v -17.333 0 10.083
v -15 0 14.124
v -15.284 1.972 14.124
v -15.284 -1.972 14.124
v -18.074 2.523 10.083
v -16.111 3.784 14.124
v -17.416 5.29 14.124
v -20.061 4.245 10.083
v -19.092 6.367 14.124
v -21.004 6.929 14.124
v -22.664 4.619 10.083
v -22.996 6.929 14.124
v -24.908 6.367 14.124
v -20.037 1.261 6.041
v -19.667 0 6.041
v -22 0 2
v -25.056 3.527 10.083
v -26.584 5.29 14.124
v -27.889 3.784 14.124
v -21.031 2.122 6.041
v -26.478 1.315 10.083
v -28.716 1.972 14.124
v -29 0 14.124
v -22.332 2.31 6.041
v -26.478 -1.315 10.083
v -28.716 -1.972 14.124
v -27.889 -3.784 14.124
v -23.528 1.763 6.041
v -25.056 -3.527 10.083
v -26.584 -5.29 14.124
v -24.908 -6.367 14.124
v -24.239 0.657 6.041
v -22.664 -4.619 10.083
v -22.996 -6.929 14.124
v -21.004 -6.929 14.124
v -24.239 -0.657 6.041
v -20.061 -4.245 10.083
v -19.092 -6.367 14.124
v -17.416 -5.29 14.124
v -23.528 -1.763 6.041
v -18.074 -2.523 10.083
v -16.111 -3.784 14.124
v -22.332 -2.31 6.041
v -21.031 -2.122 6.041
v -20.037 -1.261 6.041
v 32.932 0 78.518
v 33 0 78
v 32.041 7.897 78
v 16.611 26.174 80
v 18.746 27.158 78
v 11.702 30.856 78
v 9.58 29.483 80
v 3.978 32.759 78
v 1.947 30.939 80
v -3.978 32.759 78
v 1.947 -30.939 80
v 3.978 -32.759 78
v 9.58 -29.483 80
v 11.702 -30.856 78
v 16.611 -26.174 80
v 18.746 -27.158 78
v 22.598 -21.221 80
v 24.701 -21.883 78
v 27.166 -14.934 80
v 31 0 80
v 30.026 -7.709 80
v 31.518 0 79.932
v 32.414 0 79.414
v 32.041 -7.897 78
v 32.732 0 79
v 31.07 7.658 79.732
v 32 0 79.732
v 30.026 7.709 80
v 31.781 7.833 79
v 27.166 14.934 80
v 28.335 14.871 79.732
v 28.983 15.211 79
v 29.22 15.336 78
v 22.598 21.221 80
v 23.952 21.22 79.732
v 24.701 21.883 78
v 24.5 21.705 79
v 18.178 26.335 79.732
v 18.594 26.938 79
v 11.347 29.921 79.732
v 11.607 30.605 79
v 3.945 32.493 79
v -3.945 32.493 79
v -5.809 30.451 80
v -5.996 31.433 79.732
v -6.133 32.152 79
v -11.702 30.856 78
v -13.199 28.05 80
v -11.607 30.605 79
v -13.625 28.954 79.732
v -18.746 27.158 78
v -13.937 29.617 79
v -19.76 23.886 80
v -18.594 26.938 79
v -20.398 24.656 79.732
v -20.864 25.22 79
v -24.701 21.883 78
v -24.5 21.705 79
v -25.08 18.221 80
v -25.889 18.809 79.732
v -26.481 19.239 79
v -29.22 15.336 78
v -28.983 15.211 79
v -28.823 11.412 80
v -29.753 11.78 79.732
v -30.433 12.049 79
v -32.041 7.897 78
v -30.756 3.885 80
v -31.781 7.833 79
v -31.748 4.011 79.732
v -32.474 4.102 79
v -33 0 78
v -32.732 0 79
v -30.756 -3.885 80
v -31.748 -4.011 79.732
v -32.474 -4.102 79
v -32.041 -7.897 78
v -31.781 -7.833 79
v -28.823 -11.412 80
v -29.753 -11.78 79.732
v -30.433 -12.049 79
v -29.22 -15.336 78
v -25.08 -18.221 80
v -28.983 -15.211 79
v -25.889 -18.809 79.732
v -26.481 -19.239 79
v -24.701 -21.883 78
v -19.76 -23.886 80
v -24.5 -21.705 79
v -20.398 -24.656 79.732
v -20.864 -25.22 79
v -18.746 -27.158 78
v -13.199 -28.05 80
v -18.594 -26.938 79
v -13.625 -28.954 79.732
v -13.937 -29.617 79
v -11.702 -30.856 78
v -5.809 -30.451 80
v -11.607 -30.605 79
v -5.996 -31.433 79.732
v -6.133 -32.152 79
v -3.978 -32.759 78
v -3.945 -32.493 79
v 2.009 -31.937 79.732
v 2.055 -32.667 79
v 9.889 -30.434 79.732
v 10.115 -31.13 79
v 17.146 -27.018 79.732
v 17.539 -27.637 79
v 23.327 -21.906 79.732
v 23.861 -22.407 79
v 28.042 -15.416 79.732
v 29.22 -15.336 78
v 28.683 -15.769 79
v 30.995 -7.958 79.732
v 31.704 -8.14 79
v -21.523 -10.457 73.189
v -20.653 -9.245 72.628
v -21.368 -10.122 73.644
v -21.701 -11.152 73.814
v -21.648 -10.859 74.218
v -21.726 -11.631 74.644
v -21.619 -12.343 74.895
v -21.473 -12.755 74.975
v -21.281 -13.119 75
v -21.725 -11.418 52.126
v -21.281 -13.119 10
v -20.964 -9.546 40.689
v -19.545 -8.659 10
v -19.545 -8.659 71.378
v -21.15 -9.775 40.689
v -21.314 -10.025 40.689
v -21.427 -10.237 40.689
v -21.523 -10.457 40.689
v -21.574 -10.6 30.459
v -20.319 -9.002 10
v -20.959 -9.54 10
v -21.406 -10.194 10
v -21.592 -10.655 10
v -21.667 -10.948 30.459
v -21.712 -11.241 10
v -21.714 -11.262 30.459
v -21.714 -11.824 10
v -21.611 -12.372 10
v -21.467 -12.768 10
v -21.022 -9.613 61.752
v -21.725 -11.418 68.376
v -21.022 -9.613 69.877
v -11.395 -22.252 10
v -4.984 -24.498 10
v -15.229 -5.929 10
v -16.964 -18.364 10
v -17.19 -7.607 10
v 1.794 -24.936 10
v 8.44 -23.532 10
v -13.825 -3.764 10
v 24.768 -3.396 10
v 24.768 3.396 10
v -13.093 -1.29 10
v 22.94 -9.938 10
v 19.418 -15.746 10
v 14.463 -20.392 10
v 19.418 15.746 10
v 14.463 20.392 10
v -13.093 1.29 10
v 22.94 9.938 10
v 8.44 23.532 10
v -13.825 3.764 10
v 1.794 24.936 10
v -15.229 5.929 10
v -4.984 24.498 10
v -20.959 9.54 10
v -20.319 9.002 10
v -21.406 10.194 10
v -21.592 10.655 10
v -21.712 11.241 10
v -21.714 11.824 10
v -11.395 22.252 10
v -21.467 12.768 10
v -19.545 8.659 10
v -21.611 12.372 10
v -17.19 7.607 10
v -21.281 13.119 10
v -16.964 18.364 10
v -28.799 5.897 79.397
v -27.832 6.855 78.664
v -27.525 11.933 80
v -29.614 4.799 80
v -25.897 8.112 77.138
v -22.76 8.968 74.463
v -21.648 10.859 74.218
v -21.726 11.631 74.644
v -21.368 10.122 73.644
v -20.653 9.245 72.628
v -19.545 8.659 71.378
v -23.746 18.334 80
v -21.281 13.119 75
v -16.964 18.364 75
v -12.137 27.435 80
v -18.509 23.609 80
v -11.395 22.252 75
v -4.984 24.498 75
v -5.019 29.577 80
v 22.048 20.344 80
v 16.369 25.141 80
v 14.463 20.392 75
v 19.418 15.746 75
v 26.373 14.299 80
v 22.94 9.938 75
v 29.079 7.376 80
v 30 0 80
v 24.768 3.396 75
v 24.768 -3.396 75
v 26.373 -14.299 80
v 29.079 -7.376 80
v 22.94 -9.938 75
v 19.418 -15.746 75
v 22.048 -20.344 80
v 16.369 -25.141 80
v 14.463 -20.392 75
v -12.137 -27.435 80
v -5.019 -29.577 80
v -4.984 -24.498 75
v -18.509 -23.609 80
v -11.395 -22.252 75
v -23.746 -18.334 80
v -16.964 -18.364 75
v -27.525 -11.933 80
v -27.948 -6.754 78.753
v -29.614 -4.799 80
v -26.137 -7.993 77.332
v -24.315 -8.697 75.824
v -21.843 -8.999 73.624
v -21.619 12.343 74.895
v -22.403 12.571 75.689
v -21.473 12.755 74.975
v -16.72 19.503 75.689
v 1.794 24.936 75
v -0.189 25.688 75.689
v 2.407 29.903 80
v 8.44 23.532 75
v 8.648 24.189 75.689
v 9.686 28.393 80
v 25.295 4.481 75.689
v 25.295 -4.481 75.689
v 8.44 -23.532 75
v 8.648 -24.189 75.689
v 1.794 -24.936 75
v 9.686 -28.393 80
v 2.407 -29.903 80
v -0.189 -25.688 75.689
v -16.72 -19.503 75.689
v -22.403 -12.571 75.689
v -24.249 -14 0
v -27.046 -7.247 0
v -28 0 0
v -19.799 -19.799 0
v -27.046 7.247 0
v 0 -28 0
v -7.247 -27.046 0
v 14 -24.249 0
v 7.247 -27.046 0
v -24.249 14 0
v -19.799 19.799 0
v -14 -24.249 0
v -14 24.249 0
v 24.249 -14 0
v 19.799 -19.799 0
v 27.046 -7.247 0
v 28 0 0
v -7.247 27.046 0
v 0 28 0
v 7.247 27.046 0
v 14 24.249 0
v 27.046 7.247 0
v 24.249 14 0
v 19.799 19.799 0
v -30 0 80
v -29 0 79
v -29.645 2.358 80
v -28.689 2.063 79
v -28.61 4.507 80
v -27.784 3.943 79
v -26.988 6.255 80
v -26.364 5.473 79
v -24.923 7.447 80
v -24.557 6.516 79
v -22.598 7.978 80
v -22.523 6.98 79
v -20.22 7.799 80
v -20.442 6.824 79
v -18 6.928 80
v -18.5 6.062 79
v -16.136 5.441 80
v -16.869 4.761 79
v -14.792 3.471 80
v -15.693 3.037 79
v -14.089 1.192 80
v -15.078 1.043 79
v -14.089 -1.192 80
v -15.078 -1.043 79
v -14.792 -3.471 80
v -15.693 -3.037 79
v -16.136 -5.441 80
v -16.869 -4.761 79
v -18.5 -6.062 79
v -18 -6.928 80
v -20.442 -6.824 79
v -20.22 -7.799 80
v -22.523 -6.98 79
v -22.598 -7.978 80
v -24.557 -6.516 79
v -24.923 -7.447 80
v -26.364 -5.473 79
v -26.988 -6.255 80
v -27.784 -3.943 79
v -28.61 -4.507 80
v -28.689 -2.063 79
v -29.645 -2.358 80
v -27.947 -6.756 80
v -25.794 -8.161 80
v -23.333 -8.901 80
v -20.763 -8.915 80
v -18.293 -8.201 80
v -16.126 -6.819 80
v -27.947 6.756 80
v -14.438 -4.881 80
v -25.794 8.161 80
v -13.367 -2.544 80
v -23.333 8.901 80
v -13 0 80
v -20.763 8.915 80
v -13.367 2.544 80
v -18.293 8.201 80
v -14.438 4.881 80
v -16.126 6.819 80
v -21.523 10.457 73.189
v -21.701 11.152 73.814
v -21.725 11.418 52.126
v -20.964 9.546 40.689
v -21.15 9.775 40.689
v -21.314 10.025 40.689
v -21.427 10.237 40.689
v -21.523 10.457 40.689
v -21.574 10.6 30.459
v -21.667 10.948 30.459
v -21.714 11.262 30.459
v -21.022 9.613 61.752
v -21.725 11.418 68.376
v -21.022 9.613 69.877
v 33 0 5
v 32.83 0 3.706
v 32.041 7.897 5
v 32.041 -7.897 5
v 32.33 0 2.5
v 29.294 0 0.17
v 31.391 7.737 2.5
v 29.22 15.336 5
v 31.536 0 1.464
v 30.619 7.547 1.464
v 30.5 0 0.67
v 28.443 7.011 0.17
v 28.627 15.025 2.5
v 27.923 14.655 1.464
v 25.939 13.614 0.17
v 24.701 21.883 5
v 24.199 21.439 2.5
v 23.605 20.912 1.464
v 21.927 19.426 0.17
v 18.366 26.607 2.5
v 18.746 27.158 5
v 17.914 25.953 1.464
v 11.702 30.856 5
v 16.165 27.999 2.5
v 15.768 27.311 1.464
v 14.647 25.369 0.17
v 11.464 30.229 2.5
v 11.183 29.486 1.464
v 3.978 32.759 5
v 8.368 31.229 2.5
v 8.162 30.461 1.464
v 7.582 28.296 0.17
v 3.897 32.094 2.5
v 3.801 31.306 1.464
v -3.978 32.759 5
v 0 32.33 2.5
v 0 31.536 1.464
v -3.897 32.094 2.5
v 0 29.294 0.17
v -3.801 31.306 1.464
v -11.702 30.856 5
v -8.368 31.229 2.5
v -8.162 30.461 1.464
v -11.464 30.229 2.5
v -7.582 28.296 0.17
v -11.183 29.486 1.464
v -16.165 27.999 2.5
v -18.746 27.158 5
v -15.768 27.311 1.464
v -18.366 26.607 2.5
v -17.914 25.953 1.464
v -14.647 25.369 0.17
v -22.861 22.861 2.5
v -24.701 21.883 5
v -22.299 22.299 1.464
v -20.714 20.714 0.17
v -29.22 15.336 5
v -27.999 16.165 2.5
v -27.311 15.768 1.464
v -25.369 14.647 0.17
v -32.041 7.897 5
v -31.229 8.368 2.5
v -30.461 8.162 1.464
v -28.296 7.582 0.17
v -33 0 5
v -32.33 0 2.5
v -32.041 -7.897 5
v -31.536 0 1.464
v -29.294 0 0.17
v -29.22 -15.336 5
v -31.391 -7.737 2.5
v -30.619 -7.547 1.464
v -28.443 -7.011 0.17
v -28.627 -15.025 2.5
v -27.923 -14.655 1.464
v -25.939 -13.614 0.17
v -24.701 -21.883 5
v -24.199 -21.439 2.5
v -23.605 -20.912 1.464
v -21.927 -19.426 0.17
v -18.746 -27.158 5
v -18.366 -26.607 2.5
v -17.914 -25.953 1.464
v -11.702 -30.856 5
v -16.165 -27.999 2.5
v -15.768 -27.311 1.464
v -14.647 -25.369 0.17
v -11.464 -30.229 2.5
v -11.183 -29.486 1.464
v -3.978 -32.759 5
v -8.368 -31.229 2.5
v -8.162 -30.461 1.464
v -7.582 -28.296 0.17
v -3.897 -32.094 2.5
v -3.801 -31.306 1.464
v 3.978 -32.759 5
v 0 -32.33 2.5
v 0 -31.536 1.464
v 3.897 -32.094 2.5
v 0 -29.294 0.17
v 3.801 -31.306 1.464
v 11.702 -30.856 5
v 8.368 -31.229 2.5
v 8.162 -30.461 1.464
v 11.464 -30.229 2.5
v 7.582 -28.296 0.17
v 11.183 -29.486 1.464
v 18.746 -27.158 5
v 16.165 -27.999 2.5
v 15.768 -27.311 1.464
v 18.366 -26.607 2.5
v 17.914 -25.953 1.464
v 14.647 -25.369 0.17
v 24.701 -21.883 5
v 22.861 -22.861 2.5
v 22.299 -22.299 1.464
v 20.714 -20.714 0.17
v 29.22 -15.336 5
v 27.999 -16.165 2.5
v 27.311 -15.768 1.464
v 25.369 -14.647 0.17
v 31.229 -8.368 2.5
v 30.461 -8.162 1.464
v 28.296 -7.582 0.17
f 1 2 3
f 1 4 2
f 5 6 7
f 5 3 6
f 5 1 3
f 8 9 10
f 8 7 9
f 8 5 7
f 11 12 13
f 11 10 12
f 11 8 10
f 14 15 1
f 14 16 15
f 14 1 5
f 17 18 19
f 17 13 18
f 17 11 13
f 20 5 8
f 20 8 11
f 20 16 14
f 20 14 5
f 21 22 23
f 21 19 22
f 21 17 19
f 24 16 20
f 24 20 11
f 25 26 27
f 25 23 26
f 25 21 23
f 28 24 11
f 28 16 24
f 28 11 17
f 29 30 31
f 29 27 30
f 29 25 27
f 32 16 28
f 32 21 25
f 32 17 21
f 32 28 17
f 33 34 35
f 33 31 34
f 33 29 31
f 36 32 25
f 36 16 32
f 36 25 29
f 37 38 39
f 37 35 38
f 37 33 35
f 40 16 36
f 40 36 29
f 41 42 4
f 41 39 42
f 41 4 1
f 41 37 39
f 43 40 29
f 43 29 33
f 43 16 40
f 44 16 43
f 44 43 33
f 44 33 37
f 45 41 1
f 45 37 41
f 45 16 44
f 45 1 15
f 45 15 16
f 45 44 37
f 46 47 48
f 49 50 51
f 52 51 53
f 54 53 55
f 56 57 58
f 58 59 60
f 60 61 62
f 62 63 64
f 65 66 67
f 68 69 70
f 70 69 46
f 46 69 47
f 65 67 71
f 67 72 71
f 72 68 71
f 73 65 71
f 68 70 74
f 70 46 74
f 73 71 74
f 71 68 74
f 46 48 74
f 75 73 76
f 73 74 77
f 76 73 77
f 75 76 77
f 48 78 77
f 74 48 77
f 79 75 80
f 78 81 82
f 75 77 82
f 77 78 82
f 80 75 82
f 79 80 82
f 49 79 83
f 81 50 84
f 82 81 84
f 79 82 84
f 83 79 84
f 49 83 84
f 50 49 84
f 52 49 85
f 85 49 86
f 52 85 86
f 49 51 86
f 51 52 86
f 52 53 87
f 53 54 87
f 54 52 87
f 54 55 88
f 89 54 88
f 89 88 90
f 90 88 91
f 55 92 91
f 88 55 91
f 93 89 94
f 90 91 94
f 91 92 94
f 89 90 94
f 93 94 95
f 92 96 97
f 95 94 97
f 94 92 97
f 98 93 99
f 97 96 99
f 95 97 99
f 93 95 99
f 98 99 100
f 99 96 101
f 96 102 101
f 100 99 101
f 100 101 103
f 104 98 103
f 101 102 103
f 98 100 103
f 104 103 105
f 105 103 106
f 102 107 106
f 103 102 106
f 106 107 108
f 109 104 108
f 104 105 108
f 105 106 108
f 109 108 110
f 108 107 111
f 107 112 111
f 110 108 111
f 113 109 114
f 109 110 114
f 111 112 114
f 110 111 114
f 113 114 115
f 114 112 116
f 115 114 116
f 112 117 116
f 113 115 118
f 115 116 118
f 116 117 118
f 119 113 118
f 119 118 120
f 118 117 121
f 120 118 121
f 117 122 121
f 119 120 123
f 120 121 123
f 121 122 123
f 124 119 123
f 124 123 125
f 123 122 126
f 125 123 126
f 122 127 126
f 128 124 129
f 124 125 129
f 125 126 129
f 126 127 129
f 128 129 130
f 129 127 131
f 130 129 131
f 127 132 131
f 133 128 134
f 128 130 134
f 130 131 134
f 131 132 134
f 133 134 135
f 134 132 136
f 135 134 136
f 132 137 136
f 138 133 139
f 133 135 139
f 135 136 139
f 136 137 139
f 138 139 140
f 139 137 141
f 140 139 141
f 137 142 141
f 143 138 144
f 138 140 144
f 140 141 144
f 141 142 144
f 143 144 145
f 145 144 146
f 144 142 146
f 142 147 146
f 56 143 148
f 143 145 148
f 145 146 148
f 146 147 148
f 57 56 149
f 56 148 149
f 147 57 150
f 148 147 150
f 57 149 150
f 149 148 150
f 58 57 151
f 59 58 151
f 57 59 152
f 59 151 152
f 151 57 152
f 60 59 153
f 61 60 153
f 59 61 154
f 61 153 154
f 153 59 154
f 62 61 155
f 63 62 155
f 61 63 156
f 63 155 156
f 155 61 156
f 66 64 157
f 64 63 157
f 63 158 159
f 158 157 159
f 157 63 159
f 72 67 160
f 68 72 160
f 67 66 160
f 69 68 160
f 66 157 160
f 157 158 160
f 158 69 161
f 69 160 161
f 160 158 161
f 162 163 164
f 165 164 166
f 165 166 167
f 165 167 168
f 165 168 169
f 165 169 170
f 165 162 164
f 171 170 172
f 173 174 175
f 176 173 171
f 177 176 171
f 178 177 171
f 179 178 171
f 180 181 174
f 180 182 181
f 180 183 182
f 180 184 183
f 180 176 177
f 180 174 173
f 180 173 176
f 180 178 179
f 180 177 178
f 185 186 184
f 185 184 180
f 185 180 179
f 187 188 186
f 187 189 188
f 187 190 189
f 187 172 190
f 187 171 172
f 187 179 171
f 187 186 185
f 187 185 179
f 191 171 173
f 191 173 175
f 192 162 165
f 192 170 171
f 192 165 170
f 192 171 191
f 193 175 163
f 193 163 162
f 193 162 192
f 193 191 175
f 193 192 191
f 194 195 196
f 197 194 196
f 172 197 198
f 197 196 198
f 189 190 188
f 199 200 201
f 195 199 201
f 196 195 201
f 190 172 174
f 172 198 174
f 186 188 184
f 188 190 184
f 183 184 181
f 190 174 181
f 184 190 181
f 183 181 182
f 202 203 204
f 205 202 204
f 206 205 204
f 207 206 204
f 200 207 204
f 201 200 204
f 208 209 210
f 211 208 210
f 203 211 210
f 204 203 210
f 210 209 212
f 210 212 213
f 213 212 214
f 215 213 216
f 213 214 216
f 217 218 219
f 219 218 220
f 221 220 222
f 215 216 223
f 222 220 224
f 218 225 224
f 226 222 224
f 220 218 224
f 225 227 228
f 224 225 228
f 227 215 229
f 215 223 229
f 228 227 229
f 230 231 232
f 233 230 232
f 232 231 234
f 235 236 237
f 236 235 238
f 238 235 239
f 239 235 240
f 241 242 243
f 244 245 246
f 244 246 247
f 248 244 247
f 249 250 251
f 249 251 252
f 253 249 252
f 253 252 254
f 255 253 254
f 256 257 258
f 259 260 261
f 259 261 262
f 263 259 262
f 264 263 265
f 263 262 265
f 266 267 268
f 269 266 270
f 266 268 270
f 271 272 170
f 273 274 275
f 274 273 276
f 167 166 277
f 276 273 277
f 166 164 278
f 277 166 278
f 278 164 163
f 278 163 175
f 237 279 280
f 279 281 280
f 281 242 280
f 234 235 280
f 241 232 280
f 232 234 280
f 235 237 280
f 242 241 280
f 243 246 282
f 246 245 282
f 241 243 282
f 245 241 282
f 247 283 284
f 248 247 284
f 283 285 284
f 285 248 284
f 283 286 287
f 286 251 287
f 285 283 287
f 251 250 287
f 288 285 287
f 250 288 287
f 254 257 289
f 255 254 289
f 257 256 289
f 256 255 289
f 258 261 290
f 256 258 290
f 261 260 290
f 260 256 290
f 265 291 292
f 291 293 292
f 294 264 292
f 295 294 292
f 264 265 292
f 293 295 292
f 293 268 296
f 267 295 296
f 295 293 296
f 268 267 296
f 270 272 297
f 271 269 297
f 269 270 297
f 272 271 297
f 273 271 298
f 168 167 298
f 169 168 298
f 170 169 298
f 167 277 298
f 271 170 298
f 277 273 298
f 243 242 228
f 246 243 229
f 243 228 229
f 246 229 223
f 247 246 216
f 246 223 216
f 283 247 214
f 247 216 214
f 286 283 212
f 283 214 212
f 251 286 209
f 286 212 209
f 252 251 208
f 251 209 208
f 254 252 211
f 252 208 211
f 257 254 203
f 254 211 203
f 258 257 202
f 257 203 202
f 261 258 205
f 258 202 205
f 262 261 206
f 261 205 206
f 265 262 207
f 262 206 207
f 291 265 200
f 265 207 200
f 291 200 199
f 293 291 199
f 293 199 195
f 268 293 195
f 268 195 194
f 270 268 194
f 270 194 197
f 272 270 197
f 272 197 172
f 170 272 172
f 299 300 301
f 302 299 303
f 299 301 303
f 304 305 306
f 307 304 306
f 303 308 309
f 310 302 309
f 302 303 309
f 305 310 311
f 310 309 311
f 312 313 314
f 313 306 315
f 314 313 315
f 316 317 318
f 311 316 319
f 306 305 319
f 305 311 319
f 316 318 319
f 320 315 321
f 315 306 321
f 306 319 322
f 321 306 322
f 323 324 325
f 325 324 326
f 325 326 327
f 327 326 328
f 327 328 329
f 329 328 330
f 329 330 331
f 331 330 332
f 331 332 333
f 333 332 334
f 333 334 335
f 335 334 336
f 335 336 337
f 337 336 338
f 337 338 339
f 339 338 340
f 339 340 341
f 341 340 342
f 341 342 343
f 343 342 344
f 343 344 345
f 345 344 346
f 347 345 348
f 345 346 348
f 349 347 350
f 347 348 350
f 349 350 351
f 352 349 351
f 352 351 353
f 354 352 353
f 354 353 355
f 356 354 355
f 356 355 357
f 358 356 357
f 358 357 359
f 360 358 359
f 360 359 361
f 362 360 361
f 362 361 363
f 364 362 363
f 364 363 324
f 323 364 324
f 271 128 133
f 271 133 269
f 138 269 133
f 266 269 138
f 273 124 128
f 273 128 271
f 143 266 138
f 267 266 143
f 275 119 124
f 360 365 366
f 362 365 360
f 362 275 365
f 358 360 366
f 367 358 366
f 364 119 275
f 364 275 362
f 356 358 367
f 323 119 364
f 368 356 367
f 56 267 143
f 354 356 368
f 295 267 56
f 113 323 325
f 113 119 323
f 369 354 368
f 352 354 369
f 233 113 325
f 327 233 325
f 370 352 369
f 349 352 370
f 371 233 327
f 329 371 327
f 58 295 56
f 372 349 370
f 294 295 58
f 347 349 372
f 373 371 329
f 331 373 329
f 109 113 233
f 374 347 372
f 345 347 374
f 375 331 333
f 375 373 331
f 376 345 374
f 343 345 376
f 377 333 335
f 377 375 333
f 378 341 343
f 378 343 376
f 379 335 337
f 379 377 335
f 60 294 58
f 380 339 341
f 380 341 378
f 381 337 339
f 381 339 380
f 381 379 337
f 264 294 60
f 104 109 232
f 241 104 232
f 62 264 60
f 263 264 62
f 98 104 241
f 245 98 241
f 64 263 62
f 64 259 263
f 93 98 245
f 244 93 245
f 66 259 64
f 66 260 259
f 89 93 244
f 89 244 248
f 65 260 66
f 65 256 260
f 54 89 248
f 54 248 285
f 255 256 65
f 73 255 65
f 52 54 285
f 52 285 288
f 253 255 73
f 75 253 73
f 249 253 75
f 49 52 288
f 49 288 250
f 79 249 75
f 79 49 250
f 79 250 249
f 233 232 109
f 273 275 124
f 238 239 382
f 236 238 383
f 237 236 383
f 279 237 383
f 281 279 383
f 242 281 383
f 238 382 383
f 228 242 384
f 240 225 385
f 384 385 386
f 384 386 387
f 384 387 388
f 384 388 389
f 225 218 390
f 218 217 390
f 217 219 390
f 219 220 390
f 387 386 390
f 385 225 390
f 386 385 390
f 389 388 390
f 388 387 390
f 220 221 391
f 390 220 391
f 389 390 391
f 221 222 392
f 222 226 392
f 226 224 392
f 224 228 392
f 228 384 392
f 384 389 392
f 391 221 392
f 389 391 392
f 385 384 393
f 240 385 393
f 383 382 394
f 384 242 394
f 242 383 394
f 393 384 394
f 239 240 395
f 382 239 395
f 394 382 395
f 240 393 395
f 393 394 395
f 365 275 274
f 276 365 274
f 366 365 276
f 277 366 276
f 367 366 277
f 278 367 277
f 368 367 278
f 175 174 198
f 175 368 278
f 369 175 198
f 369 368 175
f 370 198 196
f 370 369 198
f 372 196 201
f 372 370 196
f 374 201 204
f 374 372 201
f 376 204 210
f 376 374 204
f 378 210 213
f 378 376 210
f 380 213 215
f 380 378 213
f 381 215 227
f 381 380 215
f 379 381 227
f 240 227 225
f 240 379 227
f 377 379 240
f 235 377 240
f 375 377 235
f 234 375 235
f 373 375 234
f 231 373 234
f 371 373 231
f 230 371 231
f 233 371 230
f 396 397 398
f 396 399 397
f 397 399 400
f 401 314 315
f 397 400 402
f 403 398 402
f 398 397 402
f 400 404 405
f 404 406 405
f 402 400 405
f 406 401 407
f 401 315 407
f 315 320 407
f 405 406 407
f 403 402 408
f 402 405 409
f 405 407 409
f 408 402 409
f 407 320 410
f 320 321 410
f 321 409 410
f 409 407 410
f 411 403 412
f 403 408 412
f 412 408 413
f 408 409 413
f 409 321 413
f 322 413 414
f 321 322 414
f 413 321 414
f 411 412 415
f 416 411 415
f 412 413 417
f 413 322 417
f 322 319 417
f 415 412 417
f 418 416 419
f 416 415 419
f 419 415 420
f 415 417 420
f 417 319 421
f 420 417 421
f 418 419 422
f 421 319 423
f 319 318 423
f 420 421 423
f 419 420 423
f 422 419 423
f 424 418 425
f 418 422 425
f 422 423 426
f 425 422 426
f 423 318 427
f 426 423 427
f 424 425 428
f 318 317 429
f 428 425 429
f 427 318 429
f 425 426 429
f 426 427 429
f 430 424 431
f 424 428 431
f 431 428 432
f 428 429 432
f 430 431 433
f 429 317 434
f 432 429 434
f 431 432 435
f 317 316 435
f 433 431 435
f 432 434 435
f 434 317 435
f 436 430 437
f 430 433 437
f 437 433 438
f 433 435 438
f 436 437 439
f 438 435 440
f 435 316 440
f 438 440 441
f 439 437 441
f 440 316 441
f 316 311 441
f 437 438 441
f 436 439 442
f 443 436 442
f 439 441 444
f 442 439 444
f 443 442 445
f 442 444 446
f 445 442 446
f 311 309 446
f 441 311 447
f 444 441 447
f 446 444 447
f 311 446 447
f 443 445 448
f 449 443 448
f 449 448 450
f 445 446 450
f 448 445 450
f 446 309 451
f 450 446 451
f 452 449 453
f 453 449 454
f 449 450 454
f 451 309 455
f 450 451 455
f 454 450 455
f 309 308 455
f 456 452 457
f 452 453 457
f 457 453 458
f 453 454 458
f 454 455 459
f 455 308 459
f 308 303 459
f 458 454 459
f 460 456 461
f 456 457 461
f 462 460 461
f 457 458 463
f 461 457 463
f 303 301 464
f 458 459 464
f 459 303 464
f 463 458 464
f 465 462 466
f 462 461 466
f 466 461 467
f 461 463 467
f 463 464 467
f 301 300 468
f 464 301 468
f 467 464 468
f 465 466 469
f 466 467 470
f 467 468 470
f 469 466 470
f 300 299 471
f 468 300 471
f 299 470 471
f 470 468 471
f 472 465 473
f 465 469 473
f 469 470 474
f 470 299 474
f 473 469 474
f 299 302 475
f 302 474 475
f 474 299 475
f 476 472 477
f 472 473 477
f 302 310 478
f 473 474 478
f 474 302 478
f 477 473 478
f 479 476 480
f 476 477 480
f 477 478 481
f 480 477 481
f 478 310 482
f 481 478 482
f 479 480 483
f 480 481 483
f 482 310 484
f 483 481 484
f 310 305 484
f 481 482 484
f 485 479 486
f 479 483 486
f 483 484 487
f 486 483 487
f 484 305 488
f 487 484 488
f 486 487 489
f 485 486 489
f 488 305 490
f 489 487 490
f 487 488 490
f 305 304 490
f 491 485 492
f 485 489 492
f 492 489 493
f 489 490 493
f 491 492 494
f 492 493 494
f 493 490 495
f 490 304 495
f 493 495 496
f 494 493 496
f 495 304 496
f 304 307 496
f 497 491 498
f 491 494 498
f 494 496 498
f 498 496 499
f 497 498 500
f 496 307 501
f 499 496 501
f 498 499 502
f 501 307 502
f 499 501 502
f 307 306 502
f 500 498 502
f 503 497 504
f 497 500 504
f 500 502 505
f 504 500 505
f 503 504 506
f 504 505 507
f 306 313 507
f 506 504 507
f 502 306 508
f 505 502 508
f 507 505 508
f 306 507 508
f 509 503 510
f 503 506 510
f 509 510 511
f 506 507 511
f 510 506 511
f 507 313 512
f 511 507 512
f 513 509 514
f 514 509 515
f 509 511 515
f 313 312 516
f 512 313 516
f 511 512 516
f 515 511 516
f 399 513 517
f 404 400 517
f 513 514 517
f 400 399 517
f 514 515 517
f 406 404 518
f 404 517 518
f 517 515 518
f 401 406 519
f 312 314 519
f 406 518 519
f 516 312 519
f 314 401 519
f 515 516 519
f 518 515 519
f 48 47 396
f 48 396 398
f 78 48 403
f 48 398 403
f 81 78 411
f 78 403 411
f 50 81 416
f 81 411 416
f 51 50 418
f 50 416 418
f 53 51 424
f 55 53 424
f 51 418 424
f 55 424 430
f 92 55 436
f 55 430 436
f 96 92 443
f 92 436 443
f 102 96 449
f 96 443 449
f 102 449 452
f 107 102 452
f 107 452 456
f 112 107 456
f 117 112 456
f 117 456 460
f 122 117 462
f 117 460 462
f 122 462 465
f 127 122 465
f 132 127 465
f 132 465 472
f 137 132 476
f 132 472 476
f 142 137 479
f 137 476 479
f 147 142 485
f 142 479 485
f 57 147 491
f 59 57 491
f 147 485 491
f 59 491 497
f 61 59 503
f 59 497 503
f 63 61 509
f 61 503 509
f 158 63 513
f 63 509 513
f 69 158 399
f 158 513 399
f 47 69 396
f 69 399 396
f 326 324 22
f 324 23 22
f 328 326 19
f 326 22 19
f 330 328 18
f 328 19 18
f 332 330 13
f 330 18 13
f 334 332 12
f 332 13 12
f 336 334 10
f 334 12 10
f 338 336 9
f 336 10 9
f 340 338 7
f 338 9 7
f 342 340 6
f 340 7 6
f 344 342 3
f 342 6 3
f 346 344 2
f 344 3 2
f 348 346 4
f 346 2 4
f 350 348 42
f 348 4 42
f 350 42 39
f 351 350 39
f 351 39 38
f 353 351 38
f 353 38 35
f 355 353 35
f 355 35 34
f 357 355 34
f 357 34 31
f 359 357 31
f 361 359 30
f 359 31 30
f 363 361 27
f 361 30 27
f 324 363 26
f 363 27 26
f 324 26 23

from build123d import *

# Parameters (mm, degrees)
SKETCH_R            = 33
PAD_DEPTH           = 80
HOLE_D              = 50
HOLE_DEPTH          = 70
HOLE_CSINK_D        = 60
HOLE_CSINK_ANGLE    = 90
SKETCH002_R         = 9
PAD001_DEPTH        = 80
HOLE001_D           = 14
HOLE001_DEPTH       = 65.875644
HOLE001_CSINK_D     = 16
HOLE001_CSINK_ANGLE = 90
HOLE001_TIPS_R      = 7
FILLET_R            = 3
FILLET001_R         = 2
FILLET002_R         = 5


with BuildPart() as part:
    # Sketch → Pad (new body)
    with BuildSketch(Plane.XY):
        Circle(SKETCH_R)
    extrude(amount=PAD_DEPTH)

    # Hole
    with Locations(Plane.XY.offset(80)):
        with Locations((0, 0)):
            CounterSinkHole(HOLE_D / 2, HOLE_CSINK_D / 2, depth=HOLE_DEPTH, counter_sink_angle=HOLE_CSINK_ANGLE)

    # Sketch002 (on Face3 of Hole) → Pad001 (join)
    with BuildSketch(Plane.XY.offset(80)):
        with Locations((-22, 0)):
            Circle(SKETCH002_R)
    extrude(amount=-PAD001_DEPTH)

    # Hole001
    with Locations(Plane.XY.offset(80)):
        with Locations((-22, 0)):
            CounterSinkHole(HOLE001_D / 2, HOLE001_CSINK_D / 2, depth=HOLE001_DEPTH, counter_sink_angle=HOLE001_CSINK_ANGLE)

    # Hole001 tips → Hole001 tip 1 section 0
    with BuildSketch(Plane.XY.offset(14.124356), mode=Mode.PRIVATE) as hole001_tip_1_s0:
        with Locations((-22, 0)):
            Circle(HOLE001_TIPS_R)
    loft([hole001_tip_1_s0.sketch, Vertex(-22, 0, 2)], mode=Mode.SUBTRACT)

    # Fillet
    fillet_edges = [part.edges().sort_by_distance(p)[0] for p in [
        (-23.363636, -8.896094, 42.5),
        (-23.363636, 8.896094, 42.5),
    ]]
    fillet(fillet_edges, radius=FILLET_R)

    # Fillet001
    fillet001_edges = [part.edges().sort_by_distance(p)[0] for p in [
        (-33, 0, 80),
    ]]
    fillet(fillet001_edges, radius=FILLET001_R)

    # Fillet002
    fillet002_edges = [part.edges().sort_by_distance(p)[0] for p in [
        (-33, 0, 0),
    ]]
    fillet(fillet002_edges, radius=FILLET002_R)


solid = part.part
